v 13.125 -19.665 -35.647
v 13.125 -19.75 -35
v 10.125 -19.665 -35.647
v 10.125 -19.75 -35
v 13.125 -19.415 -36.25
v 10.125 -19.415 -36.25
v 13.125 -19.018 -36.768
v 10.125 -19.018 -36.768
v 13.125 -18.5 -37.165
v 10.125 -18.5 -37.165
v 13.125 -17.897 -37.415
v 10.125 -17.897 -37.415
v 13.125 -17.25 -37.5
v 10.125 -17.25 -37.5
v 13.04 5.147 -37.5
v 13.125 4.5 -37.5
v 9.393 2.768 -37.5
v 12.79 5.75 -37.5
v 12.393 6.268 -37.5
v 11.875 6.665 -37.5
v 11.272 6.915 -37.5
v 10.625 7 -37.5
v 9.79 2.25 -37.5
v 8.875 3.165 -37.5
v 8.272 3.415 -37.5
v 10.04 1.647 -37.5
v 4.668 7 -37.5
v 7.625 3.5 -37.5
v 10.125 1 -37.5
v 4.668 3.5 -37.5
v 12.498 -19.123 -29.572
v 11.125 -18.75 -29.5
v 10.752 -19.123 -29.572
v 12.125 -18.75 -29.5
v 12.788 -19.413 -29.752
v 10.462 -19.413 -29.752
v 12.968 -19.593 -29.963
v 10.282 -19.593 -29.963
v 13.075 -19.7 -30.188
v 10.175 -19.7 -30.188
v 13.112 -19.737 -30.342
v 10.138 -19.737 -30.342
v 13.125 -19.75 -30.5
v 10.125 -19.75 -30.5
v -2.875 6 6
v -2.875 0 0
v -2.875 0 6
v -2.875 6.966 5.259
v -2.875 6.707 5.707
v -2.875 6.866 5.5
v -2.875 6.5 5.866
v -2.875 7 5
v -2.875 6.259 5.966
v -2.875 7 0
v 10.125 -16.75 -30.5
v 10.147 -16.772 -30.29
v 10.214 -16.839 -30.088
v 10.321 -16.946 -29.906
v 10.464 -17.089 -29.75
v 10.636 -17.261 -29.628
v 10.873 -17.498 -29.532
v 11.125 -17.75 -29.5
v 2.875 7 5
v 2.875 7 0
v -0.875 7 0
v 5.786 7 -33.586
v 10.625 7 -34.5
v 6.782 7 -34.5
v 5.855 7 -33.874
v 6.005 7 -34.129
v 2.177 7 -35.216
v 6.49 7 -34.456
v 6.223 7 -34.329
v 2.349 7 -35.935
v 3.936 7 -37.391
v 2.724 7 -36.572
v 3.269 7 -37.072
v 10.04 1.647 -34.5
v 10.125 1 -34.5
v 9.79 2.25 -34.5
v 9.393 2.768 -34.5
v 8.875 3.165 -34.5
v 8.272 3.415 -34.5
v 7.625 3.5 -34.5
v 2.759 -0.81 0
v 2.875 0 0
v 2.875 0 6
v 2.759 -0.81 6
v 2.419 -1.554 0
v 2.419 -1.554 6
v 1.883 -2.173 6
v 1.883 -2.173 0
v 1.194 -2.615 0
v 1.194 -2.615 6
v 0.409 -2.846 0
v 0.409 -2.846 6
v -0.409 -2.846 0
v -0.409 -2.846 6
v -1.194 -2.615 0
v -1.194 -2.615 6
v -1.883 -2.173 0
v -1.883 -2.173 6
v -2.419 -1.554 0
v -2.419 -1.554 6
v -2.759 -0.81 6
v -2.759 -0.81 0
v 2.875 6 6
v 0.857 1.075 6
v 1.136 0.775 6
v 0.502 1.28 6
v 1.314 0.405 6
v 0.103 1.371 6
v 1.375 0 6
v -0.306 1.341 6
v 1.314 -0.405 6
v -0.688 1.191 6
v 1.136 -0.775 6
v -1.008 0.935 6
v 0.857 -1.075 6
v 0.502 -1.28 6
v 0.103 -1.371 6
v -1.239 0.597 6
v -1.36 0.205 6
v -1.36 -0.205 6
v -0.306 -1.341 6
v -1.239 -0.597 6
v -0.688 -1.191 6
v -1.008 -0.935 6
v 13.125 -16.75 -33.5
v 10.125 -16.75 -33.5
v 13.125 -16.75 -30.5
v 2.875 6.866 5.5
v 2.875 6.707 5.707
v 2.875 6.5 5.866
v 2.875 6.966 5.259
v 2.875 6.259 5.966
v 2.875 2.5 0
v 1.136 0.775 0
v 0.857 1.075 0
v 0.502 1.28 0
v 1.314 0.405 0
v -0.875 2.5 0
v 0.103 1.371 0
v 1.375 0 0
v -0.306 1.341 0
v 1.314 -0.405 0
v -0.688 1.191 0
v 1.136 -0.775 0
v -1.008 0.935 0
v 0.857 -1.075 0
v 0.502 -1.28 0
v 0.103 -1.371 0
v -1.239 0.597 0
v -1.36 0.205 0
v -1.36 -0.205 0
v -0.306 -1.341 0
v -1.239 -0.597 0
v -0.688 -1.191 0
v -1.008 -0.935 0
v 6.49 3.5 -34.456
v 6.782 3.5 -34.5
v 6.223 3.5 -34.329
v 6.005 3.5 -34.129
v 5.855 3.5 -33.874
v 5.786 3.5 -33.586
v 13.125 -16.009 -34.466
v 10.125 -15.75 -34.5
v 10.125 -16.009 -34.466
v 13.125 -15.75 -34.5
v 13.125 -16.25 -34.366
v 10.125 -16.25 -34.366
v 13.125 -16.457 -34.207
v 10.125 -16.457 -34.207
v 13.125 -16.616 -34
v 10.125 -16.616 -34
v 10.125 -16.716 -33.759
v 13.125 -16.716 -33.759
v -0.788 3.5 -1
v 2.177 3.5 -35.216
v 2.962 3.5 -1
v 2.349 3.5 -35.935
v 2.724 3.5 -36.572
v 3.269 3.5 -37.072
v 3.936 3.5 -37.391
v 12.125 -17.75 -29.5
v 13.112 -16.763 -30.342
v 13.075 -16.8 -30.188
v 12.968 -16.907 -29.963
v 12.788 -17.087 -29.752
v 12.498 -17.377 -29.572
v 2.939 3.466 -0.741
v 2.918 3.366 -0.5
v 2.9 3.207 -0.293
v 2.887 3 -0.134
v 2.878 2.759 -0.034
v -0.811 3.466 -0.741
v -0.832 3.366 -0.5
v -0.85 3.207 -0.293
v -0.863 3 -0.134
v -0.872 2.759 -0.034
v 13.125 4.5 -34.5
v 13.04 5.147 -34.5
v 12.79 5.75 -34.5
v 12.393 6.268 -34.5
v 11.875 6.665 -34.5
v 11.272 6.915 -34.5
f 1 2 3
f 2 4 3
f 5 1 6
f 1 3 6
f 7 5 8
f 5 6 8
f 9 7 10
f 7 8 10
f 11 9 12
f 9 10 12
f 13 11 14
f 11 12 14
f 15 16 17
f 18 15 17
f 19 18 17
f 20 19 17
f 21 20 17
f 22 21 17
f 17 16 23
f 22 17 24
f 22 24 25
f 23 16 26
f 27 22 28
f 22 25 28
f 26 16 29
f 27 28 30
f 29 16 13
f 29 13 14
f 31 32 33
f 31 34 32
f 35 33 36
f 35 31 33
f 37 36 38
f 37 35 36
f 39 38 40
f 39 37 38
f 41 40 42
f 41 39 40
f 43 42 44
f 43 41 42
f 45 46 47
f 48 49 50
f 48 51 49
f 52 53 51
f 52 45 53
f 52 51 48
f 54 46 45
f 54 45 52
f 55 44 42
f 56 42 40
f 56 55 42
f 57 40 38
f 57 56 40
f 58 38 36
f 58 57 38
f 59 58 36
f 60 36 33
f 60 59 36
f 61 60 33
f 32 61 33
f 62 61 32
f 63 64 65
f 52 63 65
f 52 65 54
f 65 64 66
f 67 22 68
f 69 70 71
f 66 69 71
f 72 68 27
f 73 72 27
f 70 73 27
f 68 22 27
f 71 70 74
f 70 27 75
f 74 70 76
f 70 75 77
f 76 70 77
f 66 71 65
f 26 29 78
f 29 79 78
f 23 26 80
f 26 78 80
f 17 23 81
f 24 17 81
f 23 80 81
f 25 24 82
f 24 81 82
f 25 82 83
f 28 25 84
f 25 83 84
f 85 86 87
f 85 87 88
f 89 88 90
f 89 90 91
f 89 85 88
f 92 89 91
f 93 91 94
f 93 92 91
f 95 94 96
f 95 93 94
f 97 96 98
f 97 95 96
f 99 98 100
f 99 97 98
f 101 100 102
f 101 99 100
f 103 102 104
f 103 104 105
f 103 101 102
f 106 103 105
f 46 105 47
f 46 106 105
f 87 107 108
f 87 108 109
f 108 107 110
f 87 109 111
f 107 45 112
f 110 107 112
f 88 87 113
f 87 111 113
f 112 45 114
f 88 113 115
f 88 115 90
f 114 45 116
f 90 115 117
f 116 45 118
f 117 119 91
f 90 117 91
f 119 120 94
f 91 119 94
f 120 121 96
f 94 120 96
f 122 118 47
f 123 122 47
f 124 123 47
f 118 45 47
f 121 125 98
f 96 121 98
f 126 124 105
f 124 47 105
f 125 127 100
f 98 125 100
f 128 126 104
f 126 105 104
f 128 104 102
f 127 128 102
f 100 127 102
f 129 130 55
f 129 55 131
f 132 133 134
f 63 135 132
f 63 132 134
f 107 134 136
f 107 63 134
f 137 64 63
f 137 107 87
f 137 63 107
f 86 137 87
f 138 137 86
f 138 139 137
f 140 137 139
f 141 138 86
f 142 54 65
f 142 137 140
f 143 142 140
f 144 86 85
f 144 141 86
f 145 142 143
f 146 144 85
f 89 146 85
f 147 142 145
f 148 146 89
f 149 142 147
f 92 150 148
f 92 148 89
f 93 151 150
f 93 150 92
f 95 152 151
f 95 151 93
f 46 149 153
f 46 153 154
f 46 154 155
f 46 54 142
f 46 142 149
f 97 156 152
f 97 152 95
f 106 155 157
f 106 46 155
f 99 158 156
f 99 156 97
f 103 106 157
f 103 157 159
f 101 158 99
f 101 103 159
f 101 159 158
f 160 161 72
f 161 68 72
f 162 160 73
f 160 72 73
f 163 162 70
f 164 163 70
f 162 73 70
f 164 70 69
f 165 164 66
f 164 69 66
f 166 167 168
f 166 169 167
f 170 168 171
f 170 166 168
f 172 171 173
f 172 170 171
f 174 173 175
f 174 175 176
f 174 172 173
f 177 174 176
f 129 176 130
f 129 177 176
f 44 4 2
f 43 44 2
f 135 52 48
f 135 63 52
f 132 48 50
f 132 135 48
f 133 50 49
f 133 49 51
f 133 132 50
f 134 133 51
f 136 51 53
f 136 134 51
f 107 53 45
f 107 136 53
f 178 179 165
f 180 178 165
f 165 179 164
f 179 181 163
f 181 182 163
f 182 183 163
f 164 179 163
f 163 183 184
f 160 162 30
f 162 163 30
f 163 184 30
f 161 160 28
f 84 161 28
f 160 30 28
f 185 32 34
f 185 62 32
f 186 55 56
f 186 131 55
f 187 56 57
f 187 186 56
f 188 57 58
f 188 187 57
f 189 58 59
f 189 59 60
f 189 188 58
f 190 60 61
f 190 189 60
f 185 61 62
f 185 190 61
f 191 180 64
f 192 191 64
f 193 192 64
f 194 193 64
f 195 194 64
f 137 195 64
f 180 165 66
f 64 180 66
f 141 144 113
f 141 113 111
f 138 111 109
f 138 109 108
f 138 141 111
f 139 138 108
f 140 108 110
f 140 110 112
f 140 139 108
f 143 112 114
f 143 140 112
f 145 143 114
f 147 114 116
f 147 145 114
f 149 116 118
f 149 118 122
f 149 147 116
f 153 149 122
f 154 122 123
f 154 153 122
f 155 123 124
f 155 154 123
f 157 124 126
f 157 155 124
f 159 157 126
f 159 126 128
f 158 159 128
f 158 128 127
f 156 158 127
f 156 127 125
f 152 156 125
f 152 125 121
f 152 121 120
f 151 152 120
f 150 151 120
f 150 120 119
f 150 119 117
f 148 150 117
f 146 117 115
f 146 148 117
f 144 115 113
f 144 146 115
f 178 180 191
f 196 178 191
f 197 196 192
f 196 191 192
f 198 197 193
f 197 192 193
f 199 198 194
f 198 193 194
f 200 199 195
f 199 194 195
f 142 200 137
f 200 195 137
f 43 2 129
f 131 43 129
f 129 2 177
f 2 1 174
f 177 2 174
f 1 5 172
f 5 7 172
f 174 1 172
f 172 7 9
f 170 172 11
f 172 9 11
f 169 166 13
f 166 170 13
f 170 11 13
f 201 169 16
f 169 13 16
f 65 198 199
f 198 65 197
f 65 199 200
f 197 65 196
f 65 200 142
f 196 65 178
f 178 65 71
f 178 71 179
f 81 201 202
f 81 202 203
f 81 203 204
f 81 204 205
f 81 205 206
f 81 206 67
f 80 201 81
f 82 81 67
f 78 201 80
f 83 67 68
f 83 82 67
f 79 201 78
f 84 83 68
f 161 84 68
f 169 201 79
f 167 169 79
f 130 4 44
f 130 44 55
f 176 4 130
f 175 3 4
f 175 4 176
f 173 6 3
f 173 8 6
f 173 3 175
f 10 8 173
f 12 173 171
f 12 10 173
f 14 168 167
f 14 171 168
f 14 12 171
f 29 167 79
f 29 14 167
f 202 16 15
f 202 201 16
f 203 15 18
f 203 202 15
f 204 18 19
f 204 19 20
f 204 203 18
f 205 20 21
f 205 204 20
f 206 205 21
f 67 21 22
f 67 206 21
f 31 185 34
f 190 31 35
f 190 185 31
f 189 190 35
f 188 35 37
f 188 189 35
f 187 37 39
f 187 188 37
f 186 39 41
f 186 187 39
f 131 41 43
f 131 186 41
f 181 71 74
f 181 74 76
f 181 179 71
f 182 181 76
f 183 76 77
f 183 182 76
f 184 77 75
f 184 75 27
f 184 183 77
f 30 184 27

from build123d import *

# Parameters (mm, degrees)
SKETCH1_R           = 1.375
BOSS_EXTRUDE1_DEPTH = 6
BOSS_EXTRUDE2_START = 5.865
SKETCH9_W           = 3.5
SKETCH9_H           = 3
BOSS_EXTRUDE2_DEPTH = 7.26
BOSS_EXTRUDE3_START = -26.75
SKETCH10_W          = 3
SKETCH10_H          = 3
BOSS_EXTRUDE3_DEPTH = 23.25
SKETCH11_W          = 3
SKETCH11_H          = 3
BOSS_EXTRUDE4_DEPTH = 5
FILLET1_R           = 2.5
FILLET2_R           = 1


with BuildPart() as part:
    # Sketch1 → Boss-Extrude1 (new body)
    with BuildSketch(Plane(origin=(0, 0, 0), x_dir=(0, 1, 0), z_dir=(0, 0, 1))):
        with BuildLine():
            Line((0, 2.875), (7, 2.875))
            Line((7, 2.875), (7, -2.875))
            Line((7, -2.875), (0, -2.875))
            ThreePointArc((0, -2.875), (-2.875, 0), (0, 2.875))
        make_face()
        with Locations(Location((0, 0, 0), (0, 0, 270))):
            Circle(SKETCH1_R, mode=Mode.SUBTRACT)
    extrude(amount=BOSS_EXTRUDE1_DEPTH)

    # Sketch2 → Loft1 section 0
    with BuildSketch(Plane(origin=(0, 0, 0), x_dir=(1, 0, 0), z_dir=(0, 0, -1))):
        with BuildLine():
            Line((2.875, -7), (-0.875, -7))
            Line((-0.875, -7), (-0.875, -3.5))
            Line((-0.875, -3.5), (2.875, -3.5))
            Line((2.875, -3.5), (2.875, -7))
        make_face()
    # Sketch8 → Loft1 section 1
    with BuildSketch(Plane(origin=(0, 0, -37.5), x_dir=(-1, 0, 0), z_dir=(0, 0, -1))):
        with BuildLine():
            Line((-6.125, 3.5), (-6.125, 7))
            Line((-6.125, 7), (-2.375, 7))
            Line((-2.375, 7), (-2.375, 3.5))
            Line((-2.375, 3.5), (-6.125, 3.5))
        make_face()
    loft()

    # Sketch9 → Boss-Extrude2 (add)
    with BuildSketch(Plane.YZ.offset(BOSS_EXTRUDE2_START)):
        with Locations((5.25, -36)):
            Rectangle(SKETCH9_W, SKETCH9_H)
    extrude(amount=BOSS_EXTRUDE2_DEPTH)

    # Sketch10 → Boss-Extrude3 (add)
    with BuildSketch(Plane(origin=(0, 7, 0), x_dir=(-1, 0, 0), z_dir=(0, 1, 0)).offset(BOSS_EXTRUDE3_START)):
        with Locations((-11.625, -36)):
            Rectangle(SKETCH10_W, SKETCH10_H)
    extrude(amount=BOSS_EXTRUDE3_DEPTH)

    # Sketch11 → Boss-Extrude4 (add)
    with BuildSketch(Plane.XY.offset(-34.5)):
        with Locations((11.625, -18.25)):
            Rectangle(SKETCH11_W, SKETCH11_H)
    extrude(amount=BOSS_EXTRUDE4_DEPTH)

    # Fillet1
    fillet1_edges = [part.edges().sort_by_distance(p)[0] for p in [
        (2.375, 5.25, -37.5),
        (13.125, 7, -36),
        (11.625, -19.75, -37.5),
        (10.125, 3.5, -36),
    ]]
    fillet(fillet1_edges, radius=FILLET1_R)

    # Fillet2
    fillet2_edges = [part.edges().sort_by_distance(p)[0] for p in [
        (0, 7, 6),
        (1, 3.5, 0),
        (5.865, 5.25, -34.5),
        (11.625, -16.75, -34.5),
        (11.625, -19.75, -29.5),
        (13.125, -18.25, -29.5),
        (11.625, -16.75, -29.5),
        (10.125, -18.25, -29.5),
    ]]
    fillet(fillet2_edges, radius=FILLET2_R)


solid = part.part
